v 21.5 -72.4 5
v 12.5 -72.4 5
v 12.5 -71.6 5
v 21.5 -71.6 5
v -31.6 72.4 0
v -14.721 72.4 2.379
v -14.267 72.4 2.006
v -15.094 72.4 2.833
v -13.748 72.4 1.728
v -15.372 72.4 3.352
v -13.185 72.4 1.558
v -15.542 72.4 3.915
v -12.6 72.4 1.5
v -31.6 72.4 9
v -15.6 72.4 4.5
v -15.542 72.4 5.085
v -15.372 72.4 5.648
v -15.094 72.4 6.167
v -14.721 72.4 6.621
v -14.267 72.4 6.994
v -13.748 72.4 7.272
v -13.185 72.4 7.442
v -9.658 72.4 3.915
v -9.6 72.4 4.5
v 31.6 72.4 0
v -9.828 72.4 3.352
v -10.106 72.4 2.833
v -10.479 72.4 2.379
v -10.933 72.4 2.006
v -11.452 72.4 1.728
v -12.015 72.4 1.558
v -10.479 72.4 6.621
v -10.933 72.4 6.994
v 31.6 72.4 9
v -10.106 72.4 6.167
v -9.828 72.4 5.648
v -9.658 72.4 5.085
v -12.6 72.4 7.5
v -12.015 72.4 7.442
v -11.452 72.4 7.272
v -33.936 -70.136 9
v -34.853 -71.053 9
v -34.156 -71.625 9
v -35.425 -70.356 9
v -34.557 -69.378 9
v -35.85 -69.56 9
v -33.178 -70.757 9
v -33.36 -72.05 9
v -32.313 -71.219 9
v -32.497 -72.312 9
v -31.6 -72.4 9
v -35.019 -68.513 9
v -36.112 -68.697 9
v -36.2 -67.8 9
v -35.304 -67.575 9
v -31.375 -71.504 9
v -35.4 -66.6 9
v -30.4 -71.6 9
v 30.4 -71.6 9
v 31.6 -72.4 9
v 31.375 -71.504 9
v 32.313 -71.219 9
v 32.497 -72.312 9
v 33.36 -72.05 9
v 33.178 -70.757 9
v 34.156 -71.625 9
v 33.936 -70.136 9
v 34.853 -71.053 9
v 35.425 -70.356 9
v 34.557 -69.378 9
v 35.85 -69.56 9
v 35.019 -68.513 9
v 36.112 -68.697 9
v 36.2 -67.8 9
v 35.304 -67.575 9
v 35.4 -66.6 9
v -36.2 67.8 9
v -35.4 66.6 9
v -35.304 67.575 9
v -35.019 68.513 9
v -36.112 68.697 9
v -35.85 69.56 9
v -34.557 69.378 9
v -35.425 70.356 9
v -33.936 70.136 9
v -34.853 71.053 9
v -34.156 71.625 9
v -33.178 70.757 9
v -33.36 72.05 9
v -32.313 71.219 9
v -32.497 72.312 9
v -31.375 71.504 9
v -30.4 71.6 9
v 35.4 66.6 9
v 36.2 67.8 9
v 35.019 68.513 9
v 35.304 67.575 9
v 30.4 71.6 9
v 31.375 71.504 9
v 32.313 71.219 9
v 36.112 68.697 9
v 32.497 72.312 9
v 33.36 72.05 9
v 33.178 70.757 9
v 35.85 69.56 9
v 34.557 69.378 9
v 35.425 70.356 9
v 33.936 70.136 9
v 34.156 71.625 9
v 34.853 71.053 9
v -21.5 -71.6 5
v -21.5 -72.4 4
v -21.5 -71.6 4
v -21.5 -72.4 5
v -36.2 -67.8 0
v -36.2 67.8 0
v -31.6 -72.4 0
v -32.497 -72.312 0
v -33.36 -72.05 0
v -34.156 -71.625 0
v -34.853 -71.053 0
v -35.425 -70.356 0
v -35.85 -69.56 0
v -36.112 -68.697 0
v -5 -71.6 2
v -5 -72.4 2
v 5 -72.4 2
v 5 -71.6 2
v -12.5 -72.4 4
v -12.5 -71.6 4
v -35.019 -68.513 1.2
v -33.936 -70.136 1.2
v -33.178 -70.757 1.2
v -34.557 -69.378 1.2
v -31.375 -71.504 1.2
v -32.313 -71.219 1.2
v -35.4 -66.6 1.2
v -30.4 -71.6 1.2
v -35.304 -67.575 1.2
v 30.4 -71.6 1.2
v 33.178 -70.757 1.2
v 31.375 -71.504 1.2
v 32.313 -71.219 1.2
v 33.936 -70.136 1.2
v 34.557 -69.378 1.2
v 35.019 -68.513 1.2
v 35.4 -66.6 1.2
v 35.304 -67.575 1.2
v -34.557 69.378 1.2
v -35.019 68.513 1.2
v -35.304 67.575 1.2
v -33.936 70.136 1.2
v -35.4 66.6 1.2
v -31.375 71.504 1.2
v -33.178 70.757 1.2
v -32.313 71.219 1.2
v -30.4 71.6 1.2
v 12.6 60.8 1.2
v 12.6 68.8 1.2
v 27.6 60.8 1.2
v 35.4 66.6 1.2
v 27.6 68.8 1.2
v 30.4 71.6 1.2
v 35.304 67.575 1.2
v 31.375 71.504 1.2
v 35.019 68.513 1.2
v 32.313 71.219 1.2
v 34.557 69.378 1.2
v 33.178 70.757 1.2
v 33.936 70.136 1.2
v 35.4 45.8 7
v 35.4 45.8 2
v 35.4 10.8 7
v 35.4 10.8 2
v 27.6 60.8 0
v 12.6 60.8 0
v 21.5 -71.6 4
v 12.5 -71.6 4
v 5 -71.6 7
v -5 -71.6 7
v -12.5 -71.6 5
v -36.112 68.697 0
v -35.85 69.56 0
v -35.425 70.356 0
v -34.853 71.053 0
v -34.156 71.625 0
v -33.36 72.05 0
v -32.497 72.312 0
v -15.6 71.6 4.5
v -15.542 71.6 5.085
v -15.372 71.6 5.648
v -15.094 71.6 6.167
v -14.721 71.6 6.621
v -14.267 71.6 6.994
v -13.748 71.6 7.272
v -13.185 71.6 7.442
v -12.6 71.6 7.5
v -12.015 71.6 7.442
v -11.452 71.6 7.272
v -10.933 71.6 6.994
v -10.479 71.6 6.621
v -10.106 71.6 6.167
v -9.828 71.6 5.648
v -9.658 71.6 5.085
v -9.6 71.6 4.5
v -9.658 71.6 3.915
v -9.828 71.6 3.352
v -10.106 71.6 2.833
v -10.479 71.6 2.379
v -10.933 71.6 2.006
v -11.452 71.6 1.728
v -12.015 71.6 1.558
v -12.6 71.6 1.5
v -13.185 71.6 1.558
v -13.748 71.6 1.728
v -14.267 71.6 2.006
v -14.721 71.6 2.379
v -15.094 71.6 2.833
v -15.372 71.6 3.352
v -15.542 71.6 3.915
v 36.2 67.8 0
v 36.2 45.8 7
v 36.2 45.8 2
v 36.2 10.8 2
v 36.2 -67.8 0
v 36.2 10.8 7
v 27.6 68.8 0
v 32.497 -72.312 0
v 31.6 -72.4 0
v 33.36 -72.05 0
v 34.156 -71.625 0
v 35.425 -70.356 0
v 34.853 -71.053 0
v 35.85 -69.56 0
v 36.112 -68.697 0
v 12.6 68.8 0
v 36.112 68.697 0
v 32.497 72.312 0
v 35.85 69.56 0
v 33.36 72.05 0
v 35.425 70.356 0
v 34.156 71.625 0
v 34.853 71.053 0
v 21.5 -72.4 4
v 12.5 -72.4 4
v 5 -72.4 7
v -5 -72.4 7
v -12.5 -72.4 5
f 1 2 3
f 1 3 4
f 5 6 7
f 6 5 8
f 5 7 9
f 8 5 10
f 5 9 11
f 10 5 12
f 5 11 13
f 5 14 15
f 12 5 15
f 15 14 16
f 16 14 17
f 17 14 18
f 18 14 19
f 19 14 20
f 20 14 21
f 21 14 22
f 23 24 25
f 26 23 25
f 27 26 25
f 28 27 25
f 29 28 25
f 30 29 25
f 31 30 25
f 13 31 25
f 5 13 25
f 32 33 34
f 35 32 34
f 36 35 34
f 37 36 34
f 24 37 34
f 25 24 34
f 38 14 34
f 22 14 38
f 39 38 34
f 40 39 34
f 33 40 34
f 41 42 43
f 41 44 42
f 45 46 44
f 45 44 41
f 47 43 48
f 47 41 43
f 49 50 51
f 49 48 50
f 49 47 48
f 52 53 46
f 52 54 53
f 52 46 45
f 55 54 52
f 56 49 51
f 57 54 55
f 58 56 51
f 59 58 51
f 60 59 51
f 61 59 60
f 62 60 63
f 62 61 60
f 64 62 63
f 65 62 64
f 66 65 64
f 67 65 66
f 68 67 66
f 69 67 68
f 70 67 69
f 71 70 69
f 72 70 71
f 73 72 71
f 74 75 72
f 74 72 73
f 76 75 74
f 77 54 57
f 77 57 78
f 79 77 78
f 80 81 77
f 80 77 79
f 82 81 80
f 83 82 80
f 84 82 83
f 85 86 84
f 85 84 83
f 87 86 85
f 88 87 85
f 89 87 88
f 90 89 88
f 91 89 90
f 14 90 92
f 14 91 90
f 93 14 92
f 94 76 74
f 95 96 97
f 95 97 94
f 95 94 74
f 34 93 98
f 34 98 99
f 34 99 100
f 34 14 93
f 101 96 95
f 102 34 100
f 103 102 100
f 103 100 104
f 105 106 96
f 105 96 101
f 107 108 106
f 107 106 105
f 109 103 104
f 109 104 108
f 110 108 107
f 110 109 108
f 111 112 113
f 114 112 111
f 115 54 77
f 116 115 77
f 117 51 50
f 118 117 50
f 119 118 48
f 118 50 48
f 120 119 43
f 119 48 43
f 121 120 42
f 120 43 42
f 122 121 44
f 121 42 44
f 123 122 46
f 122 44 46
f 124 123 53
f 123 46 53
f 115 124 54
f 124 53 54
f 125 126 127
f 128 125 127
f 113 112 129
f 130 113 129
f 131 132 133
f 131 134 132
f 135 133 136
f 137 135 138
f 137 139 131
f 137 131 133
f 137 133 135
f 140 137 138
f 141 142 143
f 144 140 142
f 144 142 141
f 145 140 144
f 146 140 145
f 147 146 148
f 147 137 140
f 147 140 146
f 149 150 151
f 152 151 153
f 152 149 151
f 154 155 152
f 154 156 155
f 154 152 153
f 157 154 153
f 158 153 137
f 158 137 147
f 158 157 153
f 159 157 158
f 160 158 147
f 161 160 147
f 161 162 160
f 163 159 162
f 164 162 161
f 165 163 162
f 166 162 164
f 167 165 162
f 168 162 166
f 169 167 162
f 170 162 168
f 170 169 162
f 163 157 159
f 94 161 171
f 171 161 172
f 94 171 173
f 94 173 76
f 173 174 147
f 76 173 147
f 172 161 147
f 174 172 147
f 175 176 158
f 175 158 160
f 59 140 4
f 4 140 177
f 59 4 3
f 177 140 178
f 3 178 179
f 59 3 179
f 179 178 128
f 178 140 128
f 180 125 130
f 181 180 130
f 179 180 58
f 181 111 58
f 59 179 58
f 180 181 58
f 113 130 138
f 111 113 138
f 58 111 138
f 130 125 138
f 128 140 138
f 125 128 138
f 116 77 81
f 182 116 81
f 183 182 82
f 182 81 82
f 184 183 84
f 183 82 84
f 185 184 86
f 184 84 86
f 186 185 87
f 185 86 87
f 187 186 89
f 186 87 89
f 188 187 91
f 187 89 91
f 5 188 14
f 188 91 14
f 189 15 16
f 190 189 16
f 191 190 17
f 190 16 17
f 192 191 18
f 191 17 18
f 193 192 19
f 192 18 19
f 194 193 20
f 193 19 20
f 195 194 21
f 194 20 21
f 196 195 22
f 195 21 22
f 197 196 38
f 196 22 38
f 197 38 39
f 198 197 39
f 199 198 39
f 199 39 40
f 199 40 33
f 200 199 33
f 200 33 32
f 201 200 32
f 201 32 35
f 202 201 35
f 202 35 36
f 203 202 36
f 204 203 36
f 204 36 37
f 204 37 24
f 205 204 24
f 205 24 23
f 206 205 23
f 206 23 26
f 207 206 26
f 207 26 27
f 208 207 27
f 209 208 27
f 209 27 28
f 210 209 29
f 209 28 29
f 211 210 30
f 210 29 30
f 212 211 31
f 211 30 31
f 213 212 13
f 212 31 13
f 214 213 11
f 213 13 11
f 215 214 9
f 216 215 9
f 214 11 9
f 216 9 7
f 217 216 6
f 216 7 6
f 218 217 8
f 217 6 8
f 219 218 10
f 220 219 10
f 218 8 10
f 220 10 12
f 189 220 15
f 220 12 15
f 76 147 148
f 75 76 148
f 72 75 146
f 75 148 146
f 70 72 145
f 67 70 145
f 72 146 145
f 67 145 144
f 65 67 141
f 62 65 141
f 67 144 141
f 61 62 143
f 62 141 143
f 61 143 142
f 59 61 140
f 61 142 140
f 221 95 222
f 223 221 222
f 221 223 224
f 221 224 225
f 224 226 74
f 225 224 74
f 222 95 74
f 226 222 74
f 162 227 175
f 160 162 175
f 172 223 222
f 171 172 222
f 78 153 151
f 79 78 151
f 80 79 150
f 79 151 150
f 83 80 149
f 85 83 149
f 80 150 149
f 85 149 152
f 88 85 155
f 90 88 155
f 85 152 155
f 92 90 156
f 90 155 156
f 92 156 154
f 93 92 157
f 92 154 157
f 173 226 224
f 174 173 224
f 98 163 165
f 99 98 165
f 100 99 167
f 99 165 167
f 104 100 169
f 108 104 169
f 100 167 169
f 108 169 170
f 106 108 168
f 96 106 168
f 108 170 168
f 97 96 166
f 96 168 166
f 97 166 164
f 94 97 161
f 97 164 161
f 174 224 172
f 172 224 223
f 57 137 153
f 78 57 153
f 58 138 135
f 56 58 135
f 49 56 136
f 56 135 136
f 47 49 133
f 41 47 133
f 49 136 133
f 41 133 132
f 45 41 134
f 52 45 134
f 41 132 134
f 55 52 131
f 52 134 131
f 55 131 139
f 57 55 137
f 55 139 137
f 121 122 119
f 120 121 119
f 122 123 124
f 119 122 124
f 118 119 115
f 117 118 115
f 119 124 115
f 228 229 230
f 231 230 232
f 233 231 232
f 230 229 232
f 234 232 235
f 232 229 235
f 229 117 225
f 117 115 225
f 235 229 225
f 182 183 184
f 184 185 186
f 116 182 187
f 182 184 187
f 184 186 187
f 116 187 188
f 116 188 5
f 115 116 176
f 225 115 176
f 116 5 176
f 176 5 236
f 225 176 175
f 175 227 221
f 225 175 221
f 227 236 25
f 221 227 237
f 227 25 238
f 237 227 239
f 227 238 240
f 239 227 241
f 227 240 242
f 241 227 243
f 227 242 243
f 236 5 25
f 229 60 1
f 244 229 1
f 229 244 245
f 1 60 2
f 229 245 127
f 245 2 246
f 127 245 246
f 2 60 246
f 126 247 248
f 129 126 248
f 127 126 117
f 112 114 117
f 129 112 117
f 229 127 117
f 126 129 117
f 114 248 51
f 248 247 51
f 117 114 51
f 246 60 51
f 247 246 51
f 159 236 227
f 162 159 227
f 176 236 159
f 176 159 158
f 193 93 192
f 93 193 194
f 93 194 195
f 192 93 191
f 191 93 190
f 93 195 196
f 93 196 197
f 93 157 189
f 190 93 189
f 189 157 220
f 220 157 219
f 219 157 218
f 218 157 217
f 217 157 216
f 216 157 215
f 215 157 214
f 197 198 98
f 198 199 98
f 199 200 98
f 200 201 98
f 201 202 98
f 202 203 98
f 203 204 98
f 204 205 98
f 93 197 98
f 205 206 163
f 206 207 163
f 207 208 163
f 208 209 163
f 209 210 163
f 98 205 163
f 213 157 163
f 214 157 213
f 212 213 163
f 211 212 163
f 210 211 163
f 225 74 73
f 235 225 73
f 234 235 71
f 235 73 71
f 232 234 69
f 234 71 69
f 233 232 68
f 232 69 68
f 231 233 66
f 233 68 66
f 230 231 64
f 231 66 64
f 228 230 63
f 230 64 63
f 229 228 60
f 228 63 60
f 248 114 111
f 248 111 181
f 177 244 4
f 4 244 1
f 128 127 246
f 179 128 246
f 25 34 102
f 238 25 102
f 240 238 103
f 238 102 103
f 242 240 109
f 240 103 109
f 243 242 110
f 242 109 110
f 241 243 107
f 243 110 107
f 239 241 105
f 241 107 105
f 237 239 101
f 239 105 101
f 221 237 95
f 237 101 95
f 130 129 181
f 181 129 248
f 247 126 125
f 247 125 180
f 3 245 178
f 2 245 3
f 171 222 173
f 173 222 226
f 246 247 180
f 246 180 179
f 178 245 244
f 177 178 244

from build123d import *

# Parameters (mm, degrees)
F1_DEPTH  = 1.2
F2_DEPTH  = 9
F4_DEPTH  = 1.2
F5_W      = 10
F5_H      = 5
F6_DEPTH  = 1.2
F7_W      = 9
F7_H      = 1
F8_DEPTH  = 1.2
F9_W      = 15
F9_H      = 8
F10_DEPTH = 1.2
F11_R     = 3
F12_DEPTH = 1.2
F14_DEPTH = 9.001


with BuildPart() as f1:
    # F0 (on Top) → F1 (new body)
    with BuildSketch(Plane.XY):
        with BuildLine():
            Line((-31.6, -72.8), (31.6, -72.8))
            ThreePointArc((31.6, -72.8), (35.1355339059, -71.3355339059), (36.6, -67.8))
            Line((36.6, -67.8), (36.6, 67.8))
            ThreePointArc((36.6, 67.8), (35.1355339059, 71.3355339059), (31.6, 72.8))
            Line((31.6, 72.8), (-31.6, 72.8))
            ThreePointArc((-31.6, 72.8), (-35.1355339059, 71.3355339059), (-36.6, 67.8))
            Line((-36.6, 67.8), (-36.6, -67.8))
            ThreePointArc((-36.6, -67.8), (-35.1355339059, -71.3355339059), (-31.6, -72.8))
        make_face()
        with BuildLine():
            ThreePointArc((35.4, -66.6), (33.9355339059, -70.1355339059), (30.4, -71.6))
            Line((30.4, -71.6), (-30.4, -71.6))
            ThreePointArc((-30.4, -71.6), (-33.9355339059, -70.1355339059), (-35.4, -66.6))
            Line((-35.4, -66.6), (-35.4, 66.6))
            ThreePointArc((-35.4, 66.6), (-33.9355339059, 70.1355339059), (-30.4, 71.6))
            Line((-30.4, 71.6), (30.4, 71.6))
            ThreePointArc((30.4, 71.6), (33.9355339059, 70.1355339059), (35.4, 66.6))
            Line((35.4, 66.6), (35.4, -66.6))
        make_face(mode=Mode.SUBTRACT)
        with BuildLine():
            Line((-30.4, -71.6), (30.4, -71.6))
            ThreePointArc((30.4, -71.6), (33.9355339059, -70.1355339059), (35.4, -66.6))
            Line((35.4, -66.6), (35.4, 66.6))
            ThreePointArc((35.4, 66.6), (33.9355339059, 70.1355339059), (30.4, 71.6))
            Line((30.4, 71.6), (-30.4, 71.6))
            ThreePointArc((-30.4, 71.6), (-33.9355339059, 70.1355339059), (-35.4, 66.6))
            Line((-35.4, 66.6), (-35.4, -66.6))
            ThreePointArc((-35.4, -66.6), (-33.9355339059, -70.1355339059), (-30.4, -71.6))
        make_face()
    extrude(amount=F1_DEPTH)

    # F0 (on Top) → F2 (join)
    with BuildSketch(Plane.XY):
        with BuildLine():
            Line((-31.6, -72.8), (31.6, -72.8))
            ThreePointArc((31.6, -72.8), (35.1355339059, -71.3355339059), (36.6, -67.8))
            Line((36.6, -67.8), (36.6, 67.8))
            ThreePointArc((36.6, 67.8), (35.1355339059, 71.3355339059), (31.6, 72.8))
            Line((31.6, 72.8), (-31.6, 72.8))
            ThreePointArc((-31.6, 72.8), (-35.1355339059, 71.3355339059), (-36.6, 67.8))
            Line((-36.6, 67.8), (-36.6, -67.8))
            ThreePointArc((-36.6, -67.8), (-35.1355339059, -71.3355339059), (-31.6, -72.8))
        make_face()
        with BuildLine():
            ThreePointArc((35.4, -66.6), (33.9355339059, -70.1355339059), (30.4, -71.6))
            Line((30.4, -71.6), (-30.4, -71.6))
            ThreePointArc((-30.4, -71.6), (-33.9355339059, -70.1355339059), (-35.4, -66.6))
            Line((-35.4, -66.6), (-35.4, 66.6))
            ThreePointArc((-35.4, 66.6), (-33.9355339059, 70.1355339059), (-30.4, 71.6))
            Line((-30.4, 71.6), (30.4, 71.6))
            ThreePointArc((30.4, 71.6), (33.9355339059, 70.1355339059), (35.4, 66.6))
            Line((35.4, 66.6), (35.4, -66.6))
        make_face(mode=Mode.SUBTRACT)
    extrude(amount=F2_DEPTH)

    # F3 (on face) → F4 (cut, through all)
    with BuildSketch(Plane.YZ.offset(36.6)):
        Polygon((19.8, 2), (26.1, 2), (45.8, 2), (45.8, 7), (26.1, 7), (19.8, 7), (10.8, 7), (10.8, 2), align=None)
    extrude(amount=-F4_DEPTH, mode=Mode.SUBTRACT)

    # F5 (on face) → F6 (cut, through all)
    with BuildSketch(Plane.XZ.offset(72.8)):
        with Locations((0, 4.5)):
            Rectangle(F5_W, F5_H)
    extrude(amount=-F6_DEPTH, mode=Mode.SUBTRACT)

    # F7 (on face) → F8 (cut, through all)
    with BuildSketch(Plane.XZ.offset(72.8)):
        with Locations((-17, 4.5)):
            Rectangle(F7_W, F7_H)
        with Locations((17, 4.5)):
            Rectangle(F7_W, F7_H)
    extrude(amount=-F8_DEPTH, mode=Mode.SUBTRACT)

    # F9 (on face) → F10 (cut, through all)
    with BuildSketch(Plane(origin=(0, 0, 0), x_dir=(1, 0, 0), z_dir=(0, 0, -1))):
        with Locations((20.1, -64.8)):
            Rectangle(F9_W, F9_H)
    extrude(amount=-F10_DEPTH, mode=Mode.SUBTRACT)

    # F11 (on face) → F12 (cut, through all)
    with BuildSketch(Plane(origin=(0, 72.8, 0), x_dir=(-1, 0, 0), z_dir=(0, 1, 0))):
        with Locations((12.6, 4.5)):
            Circle(F11_R)
    extrude(amount=-F12_DEPTH, mode=Mode.SUBTRACT)

    # F13 (on face) → F14 (cut, through all)
    with BuildSketch(Plane.XY.offset(9)):
        with BuildLine():
            Line((-36.6, 67.8), (-36.6, -67.8))
            ThreePointArc((-36.6, -67.8), (-35.1355339059, -71.3355339059), (-31.6, -72.8))
            Line((-31.6, -72.8), (31.6, -72.8))
            ThreePointArc((31.6, -72.8), (35.1355339059, -71.3355339059), (36.6, -67.8))
            Line((36.6, -67.8), (36.6, 67.8))
            ThreePointArc((36.6, 67.8), (35.1355339059, 71.3355339059), (31.6, 72.8))
            Line((31.6, 72.8), (-31.6, 72.8))
            ThreePointArc((-31.6, 72.8), (-35.1355339059, 71.3355339059), (-36.6, 67.8))
        make_face()
        with BuildLine():
            Line((-31.6, 72.4), (31.6, 72.4))
            ThreePointArc((31.6, 72.4), (34.8526911935, 71.0526911935), (36.2, 67.8))
            Line((36.2, 67.8), (36.2, -67.8))
            ThreePointArc((36.2, -67.8), (34.8526911935, -71.0526911935), (31.6, -72.4))
            Line((31.6, -72.4), (-31.6, -72.4))
            ThreePointArc((-31.6, -72.4), (-34.8526911935, -71.0526911935), (-36.2, -67.8))
            Line((-36.2, -67.8), (-36.2, 67.8))
            ThreePointArc((-36.2, 67.8), (-34.8526911935, 71.0526911935), (-31.6, 72.4))
        make_face(mode=Mode.SUBTRACT)
    extrude(amount=-F14_DEPTH, mode=Mode.SUBTRACT)


solid = f1.part
